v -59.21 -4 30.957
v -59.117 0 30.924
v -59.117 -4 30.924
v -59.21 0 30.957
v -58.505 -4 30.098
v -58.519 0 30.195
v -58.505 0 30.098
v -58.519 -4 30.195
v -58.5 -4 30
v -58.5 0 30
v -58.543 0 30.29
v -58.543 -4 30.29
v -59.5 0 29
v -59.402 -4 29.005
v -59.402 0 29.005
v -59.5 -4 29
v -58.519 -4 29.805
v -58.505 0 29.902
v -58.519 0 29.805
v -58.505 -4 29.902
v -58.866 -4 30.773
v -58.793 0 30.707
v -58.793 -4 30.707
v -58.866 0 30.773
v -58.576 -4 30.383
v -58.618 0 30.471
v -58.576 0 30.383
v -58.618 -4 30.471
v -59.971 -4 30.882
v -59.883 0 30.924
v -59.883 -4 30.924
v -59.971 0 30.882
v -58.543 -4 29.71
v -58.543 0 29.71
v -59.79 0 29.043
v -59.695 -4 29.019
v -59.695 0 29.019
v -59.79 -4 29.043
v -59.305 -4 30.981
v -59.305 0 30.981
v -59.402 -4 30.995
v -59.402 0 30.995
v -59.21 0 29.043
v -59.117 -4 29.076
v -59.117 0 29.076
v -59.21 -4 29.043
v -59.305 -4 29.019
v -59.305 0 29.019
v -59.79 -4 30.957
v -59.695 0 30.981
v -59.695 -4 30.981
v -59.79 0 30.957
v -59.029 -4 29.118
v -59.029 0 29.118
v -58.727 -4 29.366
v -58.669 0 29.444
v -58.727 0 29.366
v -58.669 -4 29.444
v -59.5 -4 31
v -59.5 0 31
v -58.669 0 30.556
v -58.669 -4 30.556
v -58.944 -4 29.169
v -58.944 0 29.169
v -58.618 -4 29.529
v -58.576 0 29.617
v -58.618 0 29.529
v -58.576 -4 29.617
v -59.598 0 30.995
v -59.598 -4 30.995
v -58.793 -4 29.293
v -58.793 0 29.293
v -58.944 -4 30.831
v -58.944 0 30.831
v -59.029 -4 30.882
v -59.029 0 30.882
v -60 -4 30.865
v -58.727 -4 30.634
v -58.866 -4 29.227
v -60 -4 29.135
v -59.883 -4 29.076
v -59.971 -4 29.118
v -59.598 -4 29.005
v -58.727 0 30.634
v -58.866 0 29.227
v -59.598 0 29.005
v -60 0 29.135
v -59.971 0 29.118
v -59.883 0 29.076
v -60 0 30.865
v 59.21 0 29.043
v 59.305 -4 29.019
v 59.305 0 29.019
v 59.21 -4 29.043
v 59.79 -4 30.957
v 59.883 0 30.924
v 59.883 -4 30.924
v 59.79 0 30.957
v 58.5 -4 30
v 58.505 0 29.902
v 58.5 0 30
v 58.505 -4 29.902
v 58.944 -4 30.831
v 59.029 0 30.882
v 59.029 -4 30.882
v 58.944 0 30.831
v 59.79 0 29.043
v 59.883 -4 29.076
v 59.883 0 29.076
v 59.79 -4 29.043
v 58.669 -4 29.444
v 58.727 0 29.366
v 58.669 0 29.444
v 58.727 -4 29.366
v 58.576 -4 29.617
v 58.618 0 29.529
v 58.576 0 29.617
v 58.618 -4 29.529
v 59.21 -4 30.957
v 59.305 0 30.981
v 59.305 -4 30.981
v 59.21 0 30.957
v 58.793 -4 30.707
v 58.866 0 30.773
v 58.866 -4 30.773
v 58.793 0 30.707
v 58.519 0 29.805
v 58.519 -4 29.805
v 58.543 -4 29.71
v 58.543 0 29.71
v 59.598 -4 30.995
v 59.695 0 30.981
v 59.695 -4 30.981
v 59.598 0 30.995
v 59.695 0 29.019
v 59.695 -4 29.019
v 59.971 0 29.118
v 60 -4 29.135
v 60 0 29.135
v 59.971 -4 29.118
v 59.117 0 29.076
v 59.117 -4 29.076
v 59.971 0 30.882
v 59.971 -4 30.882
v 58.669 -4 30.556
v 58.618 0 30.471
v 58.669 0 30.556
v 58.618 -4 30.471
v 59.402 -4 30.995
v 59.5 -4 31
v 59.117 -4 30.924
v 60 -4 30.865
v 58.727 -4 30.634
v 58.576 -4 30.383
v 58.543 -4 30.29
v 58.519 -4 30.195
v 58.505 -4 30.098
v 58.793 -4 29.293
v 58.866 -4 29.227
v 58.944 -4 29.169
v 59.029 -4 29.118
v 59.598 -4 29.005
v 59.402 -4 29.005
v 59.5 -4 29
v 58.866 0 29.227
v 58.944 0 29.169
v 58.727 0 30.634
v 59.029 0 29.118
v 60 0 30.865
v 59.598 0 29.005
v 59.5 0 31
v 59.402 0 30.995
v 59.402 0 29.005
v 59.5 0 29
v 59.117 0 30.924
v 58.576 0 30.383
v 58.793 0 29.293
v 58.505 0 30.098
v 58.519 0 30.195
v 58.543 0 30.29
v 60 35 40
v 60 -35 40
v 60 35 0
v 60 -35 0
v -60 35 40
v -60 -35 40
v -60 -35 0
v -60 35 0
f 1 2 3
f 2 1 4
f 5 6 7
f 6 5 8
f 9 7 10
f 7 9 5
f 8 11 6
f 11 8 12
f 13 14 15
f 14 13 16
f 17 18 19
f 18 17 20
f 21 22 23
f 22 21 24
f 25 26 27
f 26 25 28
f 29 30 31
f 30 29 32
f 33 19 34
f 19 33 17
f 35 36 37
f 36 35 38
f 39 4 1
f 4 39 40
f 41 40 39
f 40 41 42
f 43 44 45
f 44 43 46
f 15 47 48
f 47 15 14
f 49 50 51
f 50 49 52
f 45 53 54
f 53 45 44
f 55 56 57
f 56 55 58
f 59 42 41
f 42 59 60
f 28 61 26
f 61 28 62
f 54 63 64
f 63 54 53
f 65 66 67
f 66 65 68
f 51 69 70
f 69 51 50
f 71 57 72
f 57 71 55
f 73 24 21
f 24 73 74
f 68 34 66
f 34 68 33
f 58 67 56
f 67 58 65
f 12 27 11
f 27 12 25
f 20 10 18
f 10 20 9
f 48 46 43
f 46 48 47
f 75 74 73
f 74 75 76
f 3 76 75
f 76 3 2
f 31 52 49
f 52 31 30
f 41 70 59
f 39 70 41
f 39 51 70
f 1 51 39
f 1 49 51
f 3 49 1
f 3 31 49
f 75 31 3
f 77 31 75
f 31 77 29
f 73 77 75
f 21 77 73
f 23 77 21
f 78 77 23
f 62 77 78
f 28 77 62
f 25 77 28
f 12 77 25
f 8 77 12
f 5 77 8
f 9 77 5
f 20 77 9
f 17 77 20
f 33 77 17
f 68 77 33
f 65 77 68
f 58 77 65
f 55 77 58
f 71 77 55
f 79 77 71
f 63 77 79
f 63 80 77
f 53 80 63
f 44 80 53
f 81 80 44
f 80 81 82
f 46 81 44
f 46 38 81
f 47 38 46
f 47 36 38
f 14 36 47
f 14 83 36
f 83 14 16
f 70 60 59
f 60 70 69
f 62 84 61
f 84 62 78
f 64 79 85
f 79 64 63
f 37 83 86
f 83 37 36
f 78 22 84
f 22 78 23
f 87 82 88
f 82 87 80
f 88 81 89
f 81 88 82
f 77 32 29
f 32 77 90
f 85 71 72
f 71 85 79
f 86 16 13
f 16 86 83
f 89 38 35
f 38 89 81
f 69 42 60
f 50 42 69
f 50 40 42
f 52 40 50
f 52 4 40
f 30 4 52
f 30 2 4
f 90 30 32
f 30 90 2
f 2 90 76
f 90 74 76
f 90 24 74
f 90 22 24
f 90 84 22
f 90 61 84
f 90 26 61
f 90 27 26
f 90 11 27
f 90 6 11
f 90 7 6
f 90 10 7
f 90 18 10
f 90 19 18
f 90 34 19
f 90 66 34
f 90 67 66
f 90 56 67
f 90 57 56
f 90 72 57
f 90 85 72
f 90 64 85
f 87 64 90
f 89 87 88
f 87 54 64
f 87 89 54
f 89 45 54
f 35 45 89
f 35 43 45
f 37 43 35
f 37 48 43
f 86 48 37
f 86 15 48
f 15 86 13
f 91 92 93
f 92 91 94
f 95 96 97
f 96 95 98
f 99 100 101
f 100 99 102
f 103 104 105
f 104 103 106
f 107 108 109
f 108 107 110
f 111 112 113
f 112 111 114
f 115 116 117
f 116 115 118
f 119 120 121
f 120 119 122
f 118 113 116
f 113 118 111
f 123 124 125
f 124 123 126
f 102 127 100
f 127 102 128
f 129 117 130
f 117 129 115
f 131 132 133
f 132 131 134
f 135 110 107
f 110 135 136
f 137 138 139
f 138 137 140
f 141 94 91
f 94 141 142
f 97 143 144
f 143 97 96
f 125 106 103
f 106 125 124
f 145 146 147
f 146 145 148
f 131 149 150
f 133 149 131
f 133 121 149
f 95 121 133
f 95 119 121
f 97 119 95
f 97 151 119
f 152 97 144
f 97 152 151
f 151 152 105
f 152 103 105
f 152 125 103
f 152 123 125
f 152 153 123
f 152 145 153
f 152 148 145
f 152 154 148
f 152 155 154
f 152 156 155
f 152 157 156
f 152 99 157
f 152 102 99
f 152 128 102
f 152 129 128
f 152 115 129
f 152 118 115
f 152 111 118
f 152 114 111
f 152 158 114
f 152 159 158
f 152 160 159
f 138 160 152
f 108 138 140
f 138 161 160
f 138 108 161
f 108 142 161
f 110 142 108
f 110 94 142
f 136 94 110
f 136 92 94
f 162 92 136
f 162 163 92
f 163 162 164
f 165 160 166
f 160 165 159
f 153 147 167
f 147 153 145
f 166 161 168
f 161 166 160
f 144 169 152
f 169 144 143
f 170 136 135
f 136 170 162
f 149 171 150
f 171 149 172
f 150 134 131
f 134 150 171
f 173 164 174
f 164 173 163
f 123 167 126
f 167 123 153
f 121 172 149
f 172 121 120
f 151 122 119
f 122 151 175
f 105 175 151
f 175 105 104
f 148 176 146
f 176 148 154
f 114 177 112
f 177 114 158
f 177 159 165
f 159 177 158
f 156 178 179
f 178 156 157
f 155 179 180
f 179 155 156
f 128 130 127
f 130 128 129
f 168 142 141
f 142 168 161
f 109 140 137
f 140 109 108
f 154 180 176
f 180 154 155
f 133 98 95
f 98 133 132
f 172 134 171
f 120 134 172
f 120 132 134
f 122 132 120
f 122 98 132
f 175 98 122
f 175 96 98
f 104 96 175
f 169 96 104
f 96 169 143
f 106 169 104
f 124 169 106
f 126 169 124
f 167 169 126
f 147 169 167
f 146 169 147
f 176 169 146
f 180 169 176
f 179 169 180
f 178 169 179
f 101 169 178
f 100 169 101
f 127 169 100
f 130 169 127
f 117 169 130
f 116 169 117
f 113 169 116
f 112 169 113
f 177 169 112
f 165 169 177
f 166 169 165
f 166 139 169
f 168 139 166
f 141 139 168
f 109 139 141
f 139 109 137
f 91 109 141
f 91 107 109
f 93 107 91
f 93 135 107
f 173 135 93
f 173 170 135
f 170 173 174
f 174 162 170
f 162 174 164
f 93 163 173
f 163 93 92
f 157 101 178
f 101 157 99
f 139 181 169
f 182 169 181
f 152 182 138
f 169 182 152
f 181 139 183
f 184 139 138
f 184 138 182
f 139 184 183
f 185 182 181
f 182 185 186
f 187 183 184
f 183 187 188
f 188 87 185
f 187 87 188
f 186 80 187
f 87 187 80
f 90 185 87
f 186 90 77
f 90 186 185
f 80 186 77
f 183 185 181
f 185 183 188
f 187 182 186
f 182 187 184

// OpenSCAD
// Mini horizontal gel-electrophoresis box - buffer tank
// Print orientation: tank rests on XY plane, builds up +Z

$fn = 64;

// ---- Tank dimensions ----
outer_x = 120;   // outer length (X)
outer_y = 70;    // outer width (Y)
outer_z = 40;    // outer height (Z)
wall    = 3;     // wall thickness
floor   = 3;     // floor thickness

// ---- Platform (gel tray support) ----
plat_x     = 60;   // platform length in X, centred
plat_top_z = 13;   // platform top height (10 mm above inner floor)
plat_w     = outer_y; // platform spans full inner width (Y)

// ---- Electrode holes ----
hole_d     = 2;    // hole diameter
hole_y     = 0;    // hole Y position
hole_z     = 30;   // hole Z position

// ---- Derived ----
inner_x = outer_x - 2 * wall;
inner_z = outer_z - wall;
eps     = 0.5;     // cutter overshoot

difference() {
    // Tank body
    translate([-outer_x / 2, -outer_y / 2, 0])
        cube([outer_x, outer_y, outer_z]);

    // Platform (solid, divides bottom into two chambers)
    translate([-plat_x / 2, -plat_w / 2, inner_z])
        cube([plat_x, plat_w, plat_top_z - inner_z + 0.01]);

    // Electrode holes through end walls along X
    for (sx = [-1, 1])
        translate([sx * (outer_x / 2 - eps), hole_y, hole_z])
            rotate([90, 0, 0])
                cylinder(d = hole_d, h = wall + 2 * eps);
}
